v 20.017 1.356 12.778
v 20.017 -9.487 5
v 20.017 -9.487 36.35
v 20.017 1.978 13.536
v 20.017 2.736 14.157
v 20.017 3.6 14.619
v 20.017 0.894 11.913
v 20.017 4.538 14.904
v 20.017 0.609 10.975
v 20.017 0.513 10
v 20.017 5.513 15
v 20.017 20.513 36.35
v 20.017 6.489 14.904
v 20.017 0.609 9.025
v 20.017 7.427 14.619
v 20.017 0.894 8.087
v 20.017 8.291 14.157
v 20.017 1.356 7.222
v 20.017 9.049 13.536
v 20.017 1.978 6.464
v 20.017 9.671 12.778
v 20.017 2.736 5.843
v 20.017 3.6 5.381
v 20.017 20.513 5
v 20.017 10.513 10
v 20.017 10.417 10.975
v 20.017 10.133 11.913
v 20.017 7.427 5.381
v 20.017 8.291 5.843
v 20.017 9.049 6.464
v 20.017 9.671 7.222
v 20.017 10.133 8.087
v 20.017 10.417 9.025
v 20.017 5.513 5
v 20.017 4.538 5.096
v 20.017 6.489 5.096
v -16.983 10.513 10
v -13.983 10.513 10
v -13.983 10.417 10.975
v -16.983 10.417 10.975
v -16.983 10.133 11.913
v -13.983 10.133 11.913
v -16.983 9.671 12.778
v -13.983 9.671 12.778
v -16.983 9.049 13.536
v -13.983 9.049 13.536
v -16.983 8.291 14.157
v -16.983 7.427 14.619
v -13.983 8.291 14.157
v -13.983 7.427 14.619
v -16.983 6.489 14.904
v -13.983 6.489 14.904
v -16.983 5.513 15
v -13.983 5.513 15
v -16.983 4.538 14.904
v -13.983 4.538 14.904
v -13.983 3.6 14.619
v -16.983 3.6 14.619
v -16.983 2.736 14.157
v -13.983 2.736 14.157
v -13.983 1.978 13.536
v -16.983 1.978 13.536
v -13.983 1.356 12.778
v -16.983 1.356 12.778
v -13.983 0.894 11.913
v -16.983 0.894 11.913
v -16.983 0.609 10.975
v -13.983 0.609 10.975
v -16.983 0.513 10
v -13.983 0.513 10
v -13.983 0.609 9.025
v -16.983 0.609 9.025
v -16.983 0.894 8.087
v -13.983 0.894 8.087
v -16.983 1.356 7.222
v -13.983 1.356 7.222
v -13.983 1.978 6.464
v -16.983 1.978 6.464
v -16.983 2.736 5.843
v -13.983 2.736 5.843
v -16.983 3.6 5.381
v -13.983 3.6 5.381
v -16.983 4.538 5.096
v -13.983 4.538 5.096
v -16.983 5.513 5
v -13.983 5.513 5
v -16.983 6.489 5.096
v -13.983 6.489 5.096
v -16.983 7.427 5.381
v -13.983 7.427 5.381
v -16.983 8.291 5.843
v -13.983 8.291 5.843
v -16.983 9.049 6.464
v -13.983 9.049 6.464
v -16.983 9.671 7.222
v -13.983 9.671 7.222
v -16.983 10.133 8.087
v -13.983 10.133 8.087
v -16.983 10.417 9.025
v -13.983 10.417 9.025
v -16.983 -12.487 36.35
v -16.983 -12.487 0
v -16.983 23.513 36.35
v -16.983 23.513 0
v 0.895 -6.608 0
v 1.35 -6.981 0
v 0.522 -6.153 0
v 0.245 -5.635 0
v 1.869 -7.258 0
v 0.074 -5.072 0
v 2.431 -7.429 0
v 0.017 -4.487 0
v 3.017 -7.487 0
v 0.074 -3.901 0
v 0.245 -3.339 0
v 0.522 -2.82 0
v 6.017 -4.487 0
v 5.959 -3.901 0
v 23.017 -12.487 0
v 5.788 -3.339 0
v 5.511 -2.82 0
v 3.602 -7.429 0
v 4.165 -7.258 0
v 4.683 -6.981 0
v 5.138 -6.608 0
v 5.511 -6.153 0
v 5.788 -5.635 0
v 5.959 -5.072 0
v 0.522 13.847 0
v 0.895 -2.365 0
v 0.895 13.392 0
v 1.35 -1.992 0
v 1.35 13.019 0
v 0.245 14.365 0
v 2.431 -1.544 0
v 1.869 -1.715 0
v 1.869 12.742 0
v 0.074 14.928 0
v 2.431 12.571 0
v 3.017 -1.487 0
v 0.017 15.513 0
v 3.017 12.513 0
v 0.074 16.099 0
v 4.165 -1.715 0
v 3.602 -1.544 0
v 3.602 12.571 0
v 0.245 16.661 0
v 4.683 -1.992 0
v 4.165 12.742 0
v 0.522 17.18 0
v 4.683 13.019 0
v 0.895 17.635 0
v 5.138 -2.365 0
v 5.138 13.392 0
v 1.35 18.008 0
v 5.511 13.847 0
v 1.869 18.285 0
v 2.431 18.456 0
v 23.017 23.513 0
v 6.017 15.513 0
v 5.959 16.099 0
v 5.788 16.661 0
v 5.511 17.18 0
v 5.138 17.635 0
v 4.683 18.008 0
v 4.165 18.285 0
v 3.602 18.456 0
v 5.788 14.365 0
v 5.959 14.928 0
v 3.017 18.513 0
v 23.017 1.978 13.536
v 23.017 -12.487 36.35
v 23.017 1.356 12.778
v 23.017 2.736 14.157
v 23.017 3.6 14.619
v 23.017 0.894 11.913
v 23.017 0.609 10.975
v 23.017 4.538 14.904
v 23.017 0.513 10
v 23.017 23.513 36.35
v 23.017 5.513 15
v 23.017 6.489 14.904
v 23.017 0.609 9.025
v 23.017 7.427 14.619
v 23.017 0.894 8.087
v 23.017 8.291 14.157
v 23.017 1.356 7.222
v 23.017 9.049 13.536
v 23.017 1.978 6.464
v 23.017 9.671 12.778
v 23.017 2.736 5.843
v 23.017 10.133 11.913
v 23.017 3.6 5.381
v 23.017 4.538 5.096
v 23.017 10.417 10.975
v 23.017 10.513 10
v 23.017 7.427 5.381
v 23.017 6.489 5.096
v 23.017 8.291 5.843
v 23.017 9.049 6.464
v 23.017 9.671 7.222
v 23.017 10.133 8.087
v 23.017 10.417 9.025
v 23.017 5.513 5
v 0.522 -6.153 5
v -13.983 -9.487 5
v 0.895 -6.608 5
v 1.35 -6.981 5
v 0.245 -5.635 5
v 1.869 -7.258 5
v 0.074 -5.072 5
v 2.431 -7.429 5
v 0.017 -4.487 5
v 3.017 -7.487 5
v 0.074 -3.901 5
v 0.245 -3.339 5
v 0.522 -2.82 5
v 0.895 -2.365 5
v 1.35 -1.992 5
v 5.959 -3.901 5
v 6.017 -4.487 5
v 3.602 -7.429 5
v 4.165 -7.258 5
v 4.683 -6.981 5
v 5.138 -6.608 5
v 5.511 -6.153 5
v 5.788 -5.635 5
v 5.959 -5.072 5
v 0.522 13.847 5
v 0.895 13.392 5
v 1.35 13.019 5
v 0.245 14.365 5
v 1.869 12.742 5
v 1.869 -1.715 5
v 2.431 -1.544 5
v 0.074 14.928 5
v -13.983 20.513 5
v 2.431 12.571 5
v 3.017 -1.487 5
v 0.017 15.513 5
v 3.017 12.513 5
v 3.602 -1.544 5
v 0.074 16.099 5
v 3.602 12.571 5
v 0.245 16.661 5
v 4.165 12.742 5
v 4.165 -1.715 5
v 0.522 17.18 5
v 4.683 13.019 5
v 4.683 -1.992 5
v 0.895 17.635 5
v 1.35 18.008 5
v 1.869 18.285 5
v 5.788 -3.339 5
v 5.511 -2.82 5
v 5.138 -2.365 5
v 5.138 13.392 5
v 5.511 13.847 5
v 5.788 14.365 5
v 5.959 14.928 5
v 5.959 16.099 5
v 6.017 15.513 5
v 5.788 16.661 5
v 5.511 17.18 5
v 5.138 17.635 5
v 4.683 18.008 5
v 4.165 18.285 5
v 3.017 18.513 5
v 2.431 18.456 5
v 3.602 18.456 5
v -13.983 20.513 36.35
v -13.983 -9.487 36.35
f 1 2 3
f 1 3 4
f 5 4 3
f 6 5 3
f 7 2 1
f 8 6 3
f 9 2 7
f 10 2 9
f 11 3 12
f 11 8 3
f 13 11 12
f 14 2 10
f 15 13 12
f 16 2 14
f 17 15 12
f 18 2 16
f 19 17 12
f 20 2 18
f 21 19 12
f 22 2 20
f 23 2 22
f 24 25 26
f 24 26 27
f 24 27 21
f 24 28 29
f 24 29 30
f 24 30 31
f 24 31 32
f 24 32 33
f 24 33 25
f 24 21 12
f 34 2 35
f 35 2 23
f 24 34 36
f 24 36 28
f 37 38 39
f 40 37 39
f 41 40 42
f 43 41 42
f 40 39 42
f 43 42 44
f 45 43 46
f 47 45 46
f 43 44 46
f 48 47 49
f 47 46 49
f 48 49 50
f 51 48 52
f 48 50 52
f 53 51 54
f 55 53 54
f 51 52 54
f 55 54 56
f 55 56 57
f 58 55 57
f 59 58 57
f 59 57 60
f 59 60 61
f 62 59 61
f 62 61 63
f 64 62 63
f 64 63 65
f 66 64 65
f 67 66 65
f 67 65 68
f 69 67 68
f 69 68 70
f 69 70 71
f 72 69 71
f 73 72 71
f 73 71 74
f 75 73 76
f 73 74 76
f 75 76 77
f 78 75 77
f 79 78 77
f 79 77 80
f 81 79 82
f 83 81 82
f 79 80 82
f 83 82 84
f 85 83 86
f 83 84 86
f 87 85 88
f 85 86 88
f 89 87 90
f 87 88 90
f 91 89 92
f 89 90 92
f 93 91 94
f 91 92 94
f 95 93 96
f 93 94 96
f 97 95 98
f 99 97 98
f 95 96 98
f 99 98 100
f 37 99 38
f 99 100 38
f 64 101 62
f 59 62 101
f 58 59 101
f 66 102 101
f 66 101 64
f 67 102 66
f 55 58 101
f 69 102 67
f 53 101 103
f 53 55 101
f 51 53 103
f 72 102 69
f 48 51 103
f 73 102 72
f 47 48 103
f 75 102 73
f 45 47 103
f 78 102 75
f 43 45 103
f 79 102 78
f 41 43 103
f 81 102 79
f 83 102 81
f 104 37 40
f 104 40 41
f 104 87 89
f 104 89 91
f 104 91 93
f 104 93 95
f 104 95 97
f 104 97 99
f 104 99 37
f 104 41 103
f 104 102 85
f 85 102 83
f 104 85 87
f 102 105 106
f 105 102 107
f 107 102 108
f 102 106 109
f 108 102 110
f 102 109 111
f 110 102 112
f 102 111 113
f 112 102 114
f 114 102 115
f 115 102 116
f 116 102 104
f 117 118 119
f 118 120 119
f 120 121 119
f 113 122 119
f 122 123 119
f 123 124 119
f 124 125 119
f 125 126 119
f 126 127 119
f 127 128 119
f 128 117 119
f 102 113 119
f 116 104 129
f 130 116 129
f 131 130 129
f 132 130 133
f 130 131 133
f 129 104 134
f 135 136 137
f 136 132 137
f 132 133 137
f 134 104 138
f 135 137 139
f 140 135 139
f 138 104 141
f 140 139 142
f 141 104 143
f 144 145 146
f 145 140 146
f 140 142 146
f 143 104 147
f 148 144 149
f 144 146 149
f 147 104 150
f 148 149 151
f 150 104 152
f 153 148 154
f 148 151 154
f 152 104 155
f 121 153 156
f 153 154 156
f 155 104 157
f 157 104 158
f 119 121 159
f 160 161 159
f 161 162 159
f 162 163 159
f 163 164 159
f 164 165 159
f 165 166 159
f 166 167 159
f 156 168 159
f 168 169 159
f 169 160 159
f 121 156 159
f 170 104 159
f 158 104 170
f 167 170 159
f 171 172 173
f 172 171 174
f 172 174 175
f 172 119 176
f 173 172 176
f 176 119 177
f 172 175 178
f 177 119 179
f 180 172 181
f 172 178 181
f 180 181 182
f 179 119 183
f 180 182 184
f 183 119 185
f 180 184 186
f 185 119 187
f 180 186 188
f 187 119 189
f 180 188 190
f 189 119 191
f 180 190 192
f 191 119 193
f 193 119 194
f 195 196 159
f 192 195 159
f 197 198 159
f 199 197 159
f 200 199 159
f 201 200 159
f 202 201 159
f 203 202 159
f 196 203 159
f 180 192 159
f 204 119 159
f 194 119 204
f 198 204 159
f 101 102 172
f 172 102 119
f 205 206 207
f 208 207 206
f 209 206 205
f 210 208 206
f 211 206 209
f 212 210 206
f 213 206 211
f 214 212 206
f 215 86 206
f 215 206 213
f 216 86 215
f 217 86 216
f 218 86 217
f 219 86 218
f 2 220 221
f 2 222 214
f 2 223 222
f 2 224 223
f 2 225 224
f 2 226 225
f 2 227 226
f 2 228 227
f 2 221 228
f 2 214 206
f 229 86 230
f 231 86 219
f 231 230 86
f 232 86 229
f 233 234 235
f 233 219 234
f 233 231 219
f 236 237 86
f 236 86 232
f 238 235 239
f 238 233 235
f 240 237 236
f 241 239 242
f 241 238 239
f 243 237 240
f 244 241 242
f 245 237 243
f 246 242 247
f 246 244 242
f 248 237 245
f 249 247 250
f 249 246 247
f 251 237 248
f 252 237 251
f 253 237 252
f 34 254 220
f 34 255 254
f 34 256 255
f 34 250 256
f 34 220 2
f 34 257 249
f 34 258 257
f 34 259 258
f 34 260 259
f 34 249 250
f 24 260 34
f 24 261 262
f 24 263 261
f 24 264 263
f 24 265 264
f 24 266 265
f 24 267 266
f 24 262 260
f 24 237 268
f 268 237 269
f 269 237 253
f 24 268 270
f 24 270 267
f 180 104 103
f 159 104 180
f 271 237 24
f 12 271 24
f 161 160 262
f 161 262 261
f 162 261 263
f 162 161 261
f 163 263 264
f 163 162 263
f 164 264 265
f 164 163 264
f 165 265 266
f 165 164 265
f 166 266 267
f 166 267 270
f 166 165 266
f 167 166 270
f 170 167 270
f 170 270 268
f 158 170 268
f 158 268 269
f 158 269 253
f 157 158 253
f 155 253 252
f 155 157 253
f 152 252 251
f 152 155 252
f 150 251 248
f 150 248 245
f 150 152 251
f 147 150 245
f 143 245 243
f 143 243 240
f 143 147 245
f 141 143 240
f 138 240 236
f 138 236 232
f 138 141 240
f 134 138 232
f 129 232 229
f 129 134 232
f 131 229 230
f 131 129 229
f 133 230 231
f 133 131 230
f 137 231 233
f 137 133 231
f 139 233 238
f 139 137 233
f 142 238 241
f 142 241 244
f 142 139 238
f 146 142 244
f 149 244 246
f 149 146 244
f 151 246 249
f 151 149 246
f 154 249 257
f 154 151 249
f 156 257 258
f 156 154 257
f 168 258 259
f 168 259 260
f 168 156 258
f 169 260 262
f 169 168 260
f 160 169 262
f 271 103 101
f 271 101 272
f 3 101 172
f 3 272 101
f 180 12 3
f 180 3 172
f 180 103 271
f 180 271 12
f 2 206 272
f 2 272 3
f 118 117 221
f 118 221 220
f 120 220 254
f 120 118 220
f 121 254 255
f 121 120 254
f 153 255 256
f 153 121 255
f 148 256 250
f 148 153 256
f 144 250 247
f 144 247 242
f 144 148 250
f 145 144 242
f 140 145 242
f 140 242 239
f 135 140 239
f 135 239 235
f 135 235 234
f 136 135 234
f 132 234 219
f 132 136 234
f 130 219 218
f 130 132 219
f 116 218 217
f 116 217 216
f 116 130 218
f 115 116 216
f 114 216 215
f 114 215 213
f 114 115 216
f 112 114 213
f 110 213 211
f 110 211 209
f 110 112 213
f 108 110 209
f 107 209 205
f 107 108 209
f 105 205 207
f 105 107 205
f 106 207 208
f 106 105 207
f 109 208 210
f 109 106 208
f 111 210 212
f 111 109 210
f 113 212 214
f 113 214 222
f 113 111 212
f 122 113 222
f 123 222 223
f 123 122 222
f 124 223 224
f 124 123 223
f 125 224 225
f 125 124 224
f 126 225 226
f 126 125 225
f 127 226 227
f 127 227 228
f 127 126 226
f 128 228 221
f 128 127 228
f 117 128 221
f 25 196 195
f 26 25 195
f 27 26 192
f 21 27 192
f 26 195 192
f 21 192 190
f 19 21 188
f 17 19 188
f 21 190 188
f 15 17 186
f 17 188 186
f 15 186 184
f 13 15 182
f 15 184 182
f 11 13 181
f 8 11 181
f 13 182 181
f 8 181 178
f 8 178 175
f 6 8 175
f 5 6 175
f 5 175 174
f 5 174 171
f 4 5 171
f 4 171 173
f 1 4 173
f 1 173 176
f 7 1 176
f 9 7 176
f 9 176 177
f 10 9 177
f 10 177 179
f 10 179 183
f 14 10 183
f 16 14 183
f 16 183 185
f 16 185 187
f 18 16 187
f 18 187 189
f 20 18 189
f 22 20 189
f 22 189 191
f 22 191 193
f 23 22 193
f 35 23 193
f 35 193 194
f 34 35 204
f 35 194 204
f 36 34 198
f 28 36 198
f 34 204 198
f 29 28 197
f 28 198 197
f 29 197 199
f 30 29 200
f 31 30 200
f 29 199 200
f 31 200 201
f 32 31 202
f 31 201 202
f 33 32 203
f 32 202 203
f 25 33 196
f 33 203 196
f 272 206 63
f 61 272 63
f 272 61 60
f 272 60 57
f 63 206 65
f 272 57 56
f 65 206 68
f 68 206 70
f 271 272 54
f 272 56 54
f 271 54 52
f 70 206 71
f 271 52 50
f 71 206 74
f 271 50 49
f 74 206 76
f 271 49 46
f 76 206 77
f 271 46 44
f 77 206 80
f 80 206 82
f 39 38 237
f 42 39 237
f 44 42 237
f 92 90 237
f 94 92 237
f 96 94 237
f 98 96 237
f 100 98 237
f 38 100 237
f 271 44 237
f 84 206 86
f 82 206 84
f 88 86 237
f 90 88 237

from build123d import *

# Parameters (mm, degrees)
F0_W     = 40
F0_H     = 36
F0_W_2   = 34
F0_H_2   = 30
F1_DEPTH = 36.35
F0_R     = 3
F2_DEPTH = 5
F3_R     = 5
F4_DEPTH = 40.001


with BuildPart() as f1:
    # F0 (on Top) → F1 (new body)
    with BuildSketch(Plane.XY):
        with Locations((3.016732, 5.513384)):
            Rectangle(F0_W, F0_H)
        with Locations((3.016732, 5.513384)):
            Rectangle(F0_W_2, F0_H_2, mode=Mode.SUBTRACT)
    extrude(amount=F1_DEPTH)

    # F0 (on Top) → F2 (join)
    with BuildSketch(Plane.XY):
        with Locations((3.016732, 5.513384)):
            Rectangle(F0_W, F0_H)
        with Locations((3.016732, 5.513384)):
            Rectangle(F0_W_2, F0_H_2, mode=Mode.SUBTRACT)
        with Locations((3.016732, 5.513384)):
            Rectangle(F0_W_2, F0_H_2)
        with Locations((3.016732, -4.486616)):
            Circle(F0_R, mode=Mode.SUBTRACT)
        with Locations((3.016732, 15.513384)):
            Circle(F0_R, mode=Mode.SUBTRACT)
    extrude(amount=F2_DEPTH)

    # F3 (on face) → F4 (cut, through all)
    with BuildSketch(Plane.YZ.offset(23.016732)):
        with Locations((5.513384, 10)):
            Circle(F3_R)
    extrude(amount=-F4_DEPTH, mode=Mode.SUBTRACT)


solid = f1.part
